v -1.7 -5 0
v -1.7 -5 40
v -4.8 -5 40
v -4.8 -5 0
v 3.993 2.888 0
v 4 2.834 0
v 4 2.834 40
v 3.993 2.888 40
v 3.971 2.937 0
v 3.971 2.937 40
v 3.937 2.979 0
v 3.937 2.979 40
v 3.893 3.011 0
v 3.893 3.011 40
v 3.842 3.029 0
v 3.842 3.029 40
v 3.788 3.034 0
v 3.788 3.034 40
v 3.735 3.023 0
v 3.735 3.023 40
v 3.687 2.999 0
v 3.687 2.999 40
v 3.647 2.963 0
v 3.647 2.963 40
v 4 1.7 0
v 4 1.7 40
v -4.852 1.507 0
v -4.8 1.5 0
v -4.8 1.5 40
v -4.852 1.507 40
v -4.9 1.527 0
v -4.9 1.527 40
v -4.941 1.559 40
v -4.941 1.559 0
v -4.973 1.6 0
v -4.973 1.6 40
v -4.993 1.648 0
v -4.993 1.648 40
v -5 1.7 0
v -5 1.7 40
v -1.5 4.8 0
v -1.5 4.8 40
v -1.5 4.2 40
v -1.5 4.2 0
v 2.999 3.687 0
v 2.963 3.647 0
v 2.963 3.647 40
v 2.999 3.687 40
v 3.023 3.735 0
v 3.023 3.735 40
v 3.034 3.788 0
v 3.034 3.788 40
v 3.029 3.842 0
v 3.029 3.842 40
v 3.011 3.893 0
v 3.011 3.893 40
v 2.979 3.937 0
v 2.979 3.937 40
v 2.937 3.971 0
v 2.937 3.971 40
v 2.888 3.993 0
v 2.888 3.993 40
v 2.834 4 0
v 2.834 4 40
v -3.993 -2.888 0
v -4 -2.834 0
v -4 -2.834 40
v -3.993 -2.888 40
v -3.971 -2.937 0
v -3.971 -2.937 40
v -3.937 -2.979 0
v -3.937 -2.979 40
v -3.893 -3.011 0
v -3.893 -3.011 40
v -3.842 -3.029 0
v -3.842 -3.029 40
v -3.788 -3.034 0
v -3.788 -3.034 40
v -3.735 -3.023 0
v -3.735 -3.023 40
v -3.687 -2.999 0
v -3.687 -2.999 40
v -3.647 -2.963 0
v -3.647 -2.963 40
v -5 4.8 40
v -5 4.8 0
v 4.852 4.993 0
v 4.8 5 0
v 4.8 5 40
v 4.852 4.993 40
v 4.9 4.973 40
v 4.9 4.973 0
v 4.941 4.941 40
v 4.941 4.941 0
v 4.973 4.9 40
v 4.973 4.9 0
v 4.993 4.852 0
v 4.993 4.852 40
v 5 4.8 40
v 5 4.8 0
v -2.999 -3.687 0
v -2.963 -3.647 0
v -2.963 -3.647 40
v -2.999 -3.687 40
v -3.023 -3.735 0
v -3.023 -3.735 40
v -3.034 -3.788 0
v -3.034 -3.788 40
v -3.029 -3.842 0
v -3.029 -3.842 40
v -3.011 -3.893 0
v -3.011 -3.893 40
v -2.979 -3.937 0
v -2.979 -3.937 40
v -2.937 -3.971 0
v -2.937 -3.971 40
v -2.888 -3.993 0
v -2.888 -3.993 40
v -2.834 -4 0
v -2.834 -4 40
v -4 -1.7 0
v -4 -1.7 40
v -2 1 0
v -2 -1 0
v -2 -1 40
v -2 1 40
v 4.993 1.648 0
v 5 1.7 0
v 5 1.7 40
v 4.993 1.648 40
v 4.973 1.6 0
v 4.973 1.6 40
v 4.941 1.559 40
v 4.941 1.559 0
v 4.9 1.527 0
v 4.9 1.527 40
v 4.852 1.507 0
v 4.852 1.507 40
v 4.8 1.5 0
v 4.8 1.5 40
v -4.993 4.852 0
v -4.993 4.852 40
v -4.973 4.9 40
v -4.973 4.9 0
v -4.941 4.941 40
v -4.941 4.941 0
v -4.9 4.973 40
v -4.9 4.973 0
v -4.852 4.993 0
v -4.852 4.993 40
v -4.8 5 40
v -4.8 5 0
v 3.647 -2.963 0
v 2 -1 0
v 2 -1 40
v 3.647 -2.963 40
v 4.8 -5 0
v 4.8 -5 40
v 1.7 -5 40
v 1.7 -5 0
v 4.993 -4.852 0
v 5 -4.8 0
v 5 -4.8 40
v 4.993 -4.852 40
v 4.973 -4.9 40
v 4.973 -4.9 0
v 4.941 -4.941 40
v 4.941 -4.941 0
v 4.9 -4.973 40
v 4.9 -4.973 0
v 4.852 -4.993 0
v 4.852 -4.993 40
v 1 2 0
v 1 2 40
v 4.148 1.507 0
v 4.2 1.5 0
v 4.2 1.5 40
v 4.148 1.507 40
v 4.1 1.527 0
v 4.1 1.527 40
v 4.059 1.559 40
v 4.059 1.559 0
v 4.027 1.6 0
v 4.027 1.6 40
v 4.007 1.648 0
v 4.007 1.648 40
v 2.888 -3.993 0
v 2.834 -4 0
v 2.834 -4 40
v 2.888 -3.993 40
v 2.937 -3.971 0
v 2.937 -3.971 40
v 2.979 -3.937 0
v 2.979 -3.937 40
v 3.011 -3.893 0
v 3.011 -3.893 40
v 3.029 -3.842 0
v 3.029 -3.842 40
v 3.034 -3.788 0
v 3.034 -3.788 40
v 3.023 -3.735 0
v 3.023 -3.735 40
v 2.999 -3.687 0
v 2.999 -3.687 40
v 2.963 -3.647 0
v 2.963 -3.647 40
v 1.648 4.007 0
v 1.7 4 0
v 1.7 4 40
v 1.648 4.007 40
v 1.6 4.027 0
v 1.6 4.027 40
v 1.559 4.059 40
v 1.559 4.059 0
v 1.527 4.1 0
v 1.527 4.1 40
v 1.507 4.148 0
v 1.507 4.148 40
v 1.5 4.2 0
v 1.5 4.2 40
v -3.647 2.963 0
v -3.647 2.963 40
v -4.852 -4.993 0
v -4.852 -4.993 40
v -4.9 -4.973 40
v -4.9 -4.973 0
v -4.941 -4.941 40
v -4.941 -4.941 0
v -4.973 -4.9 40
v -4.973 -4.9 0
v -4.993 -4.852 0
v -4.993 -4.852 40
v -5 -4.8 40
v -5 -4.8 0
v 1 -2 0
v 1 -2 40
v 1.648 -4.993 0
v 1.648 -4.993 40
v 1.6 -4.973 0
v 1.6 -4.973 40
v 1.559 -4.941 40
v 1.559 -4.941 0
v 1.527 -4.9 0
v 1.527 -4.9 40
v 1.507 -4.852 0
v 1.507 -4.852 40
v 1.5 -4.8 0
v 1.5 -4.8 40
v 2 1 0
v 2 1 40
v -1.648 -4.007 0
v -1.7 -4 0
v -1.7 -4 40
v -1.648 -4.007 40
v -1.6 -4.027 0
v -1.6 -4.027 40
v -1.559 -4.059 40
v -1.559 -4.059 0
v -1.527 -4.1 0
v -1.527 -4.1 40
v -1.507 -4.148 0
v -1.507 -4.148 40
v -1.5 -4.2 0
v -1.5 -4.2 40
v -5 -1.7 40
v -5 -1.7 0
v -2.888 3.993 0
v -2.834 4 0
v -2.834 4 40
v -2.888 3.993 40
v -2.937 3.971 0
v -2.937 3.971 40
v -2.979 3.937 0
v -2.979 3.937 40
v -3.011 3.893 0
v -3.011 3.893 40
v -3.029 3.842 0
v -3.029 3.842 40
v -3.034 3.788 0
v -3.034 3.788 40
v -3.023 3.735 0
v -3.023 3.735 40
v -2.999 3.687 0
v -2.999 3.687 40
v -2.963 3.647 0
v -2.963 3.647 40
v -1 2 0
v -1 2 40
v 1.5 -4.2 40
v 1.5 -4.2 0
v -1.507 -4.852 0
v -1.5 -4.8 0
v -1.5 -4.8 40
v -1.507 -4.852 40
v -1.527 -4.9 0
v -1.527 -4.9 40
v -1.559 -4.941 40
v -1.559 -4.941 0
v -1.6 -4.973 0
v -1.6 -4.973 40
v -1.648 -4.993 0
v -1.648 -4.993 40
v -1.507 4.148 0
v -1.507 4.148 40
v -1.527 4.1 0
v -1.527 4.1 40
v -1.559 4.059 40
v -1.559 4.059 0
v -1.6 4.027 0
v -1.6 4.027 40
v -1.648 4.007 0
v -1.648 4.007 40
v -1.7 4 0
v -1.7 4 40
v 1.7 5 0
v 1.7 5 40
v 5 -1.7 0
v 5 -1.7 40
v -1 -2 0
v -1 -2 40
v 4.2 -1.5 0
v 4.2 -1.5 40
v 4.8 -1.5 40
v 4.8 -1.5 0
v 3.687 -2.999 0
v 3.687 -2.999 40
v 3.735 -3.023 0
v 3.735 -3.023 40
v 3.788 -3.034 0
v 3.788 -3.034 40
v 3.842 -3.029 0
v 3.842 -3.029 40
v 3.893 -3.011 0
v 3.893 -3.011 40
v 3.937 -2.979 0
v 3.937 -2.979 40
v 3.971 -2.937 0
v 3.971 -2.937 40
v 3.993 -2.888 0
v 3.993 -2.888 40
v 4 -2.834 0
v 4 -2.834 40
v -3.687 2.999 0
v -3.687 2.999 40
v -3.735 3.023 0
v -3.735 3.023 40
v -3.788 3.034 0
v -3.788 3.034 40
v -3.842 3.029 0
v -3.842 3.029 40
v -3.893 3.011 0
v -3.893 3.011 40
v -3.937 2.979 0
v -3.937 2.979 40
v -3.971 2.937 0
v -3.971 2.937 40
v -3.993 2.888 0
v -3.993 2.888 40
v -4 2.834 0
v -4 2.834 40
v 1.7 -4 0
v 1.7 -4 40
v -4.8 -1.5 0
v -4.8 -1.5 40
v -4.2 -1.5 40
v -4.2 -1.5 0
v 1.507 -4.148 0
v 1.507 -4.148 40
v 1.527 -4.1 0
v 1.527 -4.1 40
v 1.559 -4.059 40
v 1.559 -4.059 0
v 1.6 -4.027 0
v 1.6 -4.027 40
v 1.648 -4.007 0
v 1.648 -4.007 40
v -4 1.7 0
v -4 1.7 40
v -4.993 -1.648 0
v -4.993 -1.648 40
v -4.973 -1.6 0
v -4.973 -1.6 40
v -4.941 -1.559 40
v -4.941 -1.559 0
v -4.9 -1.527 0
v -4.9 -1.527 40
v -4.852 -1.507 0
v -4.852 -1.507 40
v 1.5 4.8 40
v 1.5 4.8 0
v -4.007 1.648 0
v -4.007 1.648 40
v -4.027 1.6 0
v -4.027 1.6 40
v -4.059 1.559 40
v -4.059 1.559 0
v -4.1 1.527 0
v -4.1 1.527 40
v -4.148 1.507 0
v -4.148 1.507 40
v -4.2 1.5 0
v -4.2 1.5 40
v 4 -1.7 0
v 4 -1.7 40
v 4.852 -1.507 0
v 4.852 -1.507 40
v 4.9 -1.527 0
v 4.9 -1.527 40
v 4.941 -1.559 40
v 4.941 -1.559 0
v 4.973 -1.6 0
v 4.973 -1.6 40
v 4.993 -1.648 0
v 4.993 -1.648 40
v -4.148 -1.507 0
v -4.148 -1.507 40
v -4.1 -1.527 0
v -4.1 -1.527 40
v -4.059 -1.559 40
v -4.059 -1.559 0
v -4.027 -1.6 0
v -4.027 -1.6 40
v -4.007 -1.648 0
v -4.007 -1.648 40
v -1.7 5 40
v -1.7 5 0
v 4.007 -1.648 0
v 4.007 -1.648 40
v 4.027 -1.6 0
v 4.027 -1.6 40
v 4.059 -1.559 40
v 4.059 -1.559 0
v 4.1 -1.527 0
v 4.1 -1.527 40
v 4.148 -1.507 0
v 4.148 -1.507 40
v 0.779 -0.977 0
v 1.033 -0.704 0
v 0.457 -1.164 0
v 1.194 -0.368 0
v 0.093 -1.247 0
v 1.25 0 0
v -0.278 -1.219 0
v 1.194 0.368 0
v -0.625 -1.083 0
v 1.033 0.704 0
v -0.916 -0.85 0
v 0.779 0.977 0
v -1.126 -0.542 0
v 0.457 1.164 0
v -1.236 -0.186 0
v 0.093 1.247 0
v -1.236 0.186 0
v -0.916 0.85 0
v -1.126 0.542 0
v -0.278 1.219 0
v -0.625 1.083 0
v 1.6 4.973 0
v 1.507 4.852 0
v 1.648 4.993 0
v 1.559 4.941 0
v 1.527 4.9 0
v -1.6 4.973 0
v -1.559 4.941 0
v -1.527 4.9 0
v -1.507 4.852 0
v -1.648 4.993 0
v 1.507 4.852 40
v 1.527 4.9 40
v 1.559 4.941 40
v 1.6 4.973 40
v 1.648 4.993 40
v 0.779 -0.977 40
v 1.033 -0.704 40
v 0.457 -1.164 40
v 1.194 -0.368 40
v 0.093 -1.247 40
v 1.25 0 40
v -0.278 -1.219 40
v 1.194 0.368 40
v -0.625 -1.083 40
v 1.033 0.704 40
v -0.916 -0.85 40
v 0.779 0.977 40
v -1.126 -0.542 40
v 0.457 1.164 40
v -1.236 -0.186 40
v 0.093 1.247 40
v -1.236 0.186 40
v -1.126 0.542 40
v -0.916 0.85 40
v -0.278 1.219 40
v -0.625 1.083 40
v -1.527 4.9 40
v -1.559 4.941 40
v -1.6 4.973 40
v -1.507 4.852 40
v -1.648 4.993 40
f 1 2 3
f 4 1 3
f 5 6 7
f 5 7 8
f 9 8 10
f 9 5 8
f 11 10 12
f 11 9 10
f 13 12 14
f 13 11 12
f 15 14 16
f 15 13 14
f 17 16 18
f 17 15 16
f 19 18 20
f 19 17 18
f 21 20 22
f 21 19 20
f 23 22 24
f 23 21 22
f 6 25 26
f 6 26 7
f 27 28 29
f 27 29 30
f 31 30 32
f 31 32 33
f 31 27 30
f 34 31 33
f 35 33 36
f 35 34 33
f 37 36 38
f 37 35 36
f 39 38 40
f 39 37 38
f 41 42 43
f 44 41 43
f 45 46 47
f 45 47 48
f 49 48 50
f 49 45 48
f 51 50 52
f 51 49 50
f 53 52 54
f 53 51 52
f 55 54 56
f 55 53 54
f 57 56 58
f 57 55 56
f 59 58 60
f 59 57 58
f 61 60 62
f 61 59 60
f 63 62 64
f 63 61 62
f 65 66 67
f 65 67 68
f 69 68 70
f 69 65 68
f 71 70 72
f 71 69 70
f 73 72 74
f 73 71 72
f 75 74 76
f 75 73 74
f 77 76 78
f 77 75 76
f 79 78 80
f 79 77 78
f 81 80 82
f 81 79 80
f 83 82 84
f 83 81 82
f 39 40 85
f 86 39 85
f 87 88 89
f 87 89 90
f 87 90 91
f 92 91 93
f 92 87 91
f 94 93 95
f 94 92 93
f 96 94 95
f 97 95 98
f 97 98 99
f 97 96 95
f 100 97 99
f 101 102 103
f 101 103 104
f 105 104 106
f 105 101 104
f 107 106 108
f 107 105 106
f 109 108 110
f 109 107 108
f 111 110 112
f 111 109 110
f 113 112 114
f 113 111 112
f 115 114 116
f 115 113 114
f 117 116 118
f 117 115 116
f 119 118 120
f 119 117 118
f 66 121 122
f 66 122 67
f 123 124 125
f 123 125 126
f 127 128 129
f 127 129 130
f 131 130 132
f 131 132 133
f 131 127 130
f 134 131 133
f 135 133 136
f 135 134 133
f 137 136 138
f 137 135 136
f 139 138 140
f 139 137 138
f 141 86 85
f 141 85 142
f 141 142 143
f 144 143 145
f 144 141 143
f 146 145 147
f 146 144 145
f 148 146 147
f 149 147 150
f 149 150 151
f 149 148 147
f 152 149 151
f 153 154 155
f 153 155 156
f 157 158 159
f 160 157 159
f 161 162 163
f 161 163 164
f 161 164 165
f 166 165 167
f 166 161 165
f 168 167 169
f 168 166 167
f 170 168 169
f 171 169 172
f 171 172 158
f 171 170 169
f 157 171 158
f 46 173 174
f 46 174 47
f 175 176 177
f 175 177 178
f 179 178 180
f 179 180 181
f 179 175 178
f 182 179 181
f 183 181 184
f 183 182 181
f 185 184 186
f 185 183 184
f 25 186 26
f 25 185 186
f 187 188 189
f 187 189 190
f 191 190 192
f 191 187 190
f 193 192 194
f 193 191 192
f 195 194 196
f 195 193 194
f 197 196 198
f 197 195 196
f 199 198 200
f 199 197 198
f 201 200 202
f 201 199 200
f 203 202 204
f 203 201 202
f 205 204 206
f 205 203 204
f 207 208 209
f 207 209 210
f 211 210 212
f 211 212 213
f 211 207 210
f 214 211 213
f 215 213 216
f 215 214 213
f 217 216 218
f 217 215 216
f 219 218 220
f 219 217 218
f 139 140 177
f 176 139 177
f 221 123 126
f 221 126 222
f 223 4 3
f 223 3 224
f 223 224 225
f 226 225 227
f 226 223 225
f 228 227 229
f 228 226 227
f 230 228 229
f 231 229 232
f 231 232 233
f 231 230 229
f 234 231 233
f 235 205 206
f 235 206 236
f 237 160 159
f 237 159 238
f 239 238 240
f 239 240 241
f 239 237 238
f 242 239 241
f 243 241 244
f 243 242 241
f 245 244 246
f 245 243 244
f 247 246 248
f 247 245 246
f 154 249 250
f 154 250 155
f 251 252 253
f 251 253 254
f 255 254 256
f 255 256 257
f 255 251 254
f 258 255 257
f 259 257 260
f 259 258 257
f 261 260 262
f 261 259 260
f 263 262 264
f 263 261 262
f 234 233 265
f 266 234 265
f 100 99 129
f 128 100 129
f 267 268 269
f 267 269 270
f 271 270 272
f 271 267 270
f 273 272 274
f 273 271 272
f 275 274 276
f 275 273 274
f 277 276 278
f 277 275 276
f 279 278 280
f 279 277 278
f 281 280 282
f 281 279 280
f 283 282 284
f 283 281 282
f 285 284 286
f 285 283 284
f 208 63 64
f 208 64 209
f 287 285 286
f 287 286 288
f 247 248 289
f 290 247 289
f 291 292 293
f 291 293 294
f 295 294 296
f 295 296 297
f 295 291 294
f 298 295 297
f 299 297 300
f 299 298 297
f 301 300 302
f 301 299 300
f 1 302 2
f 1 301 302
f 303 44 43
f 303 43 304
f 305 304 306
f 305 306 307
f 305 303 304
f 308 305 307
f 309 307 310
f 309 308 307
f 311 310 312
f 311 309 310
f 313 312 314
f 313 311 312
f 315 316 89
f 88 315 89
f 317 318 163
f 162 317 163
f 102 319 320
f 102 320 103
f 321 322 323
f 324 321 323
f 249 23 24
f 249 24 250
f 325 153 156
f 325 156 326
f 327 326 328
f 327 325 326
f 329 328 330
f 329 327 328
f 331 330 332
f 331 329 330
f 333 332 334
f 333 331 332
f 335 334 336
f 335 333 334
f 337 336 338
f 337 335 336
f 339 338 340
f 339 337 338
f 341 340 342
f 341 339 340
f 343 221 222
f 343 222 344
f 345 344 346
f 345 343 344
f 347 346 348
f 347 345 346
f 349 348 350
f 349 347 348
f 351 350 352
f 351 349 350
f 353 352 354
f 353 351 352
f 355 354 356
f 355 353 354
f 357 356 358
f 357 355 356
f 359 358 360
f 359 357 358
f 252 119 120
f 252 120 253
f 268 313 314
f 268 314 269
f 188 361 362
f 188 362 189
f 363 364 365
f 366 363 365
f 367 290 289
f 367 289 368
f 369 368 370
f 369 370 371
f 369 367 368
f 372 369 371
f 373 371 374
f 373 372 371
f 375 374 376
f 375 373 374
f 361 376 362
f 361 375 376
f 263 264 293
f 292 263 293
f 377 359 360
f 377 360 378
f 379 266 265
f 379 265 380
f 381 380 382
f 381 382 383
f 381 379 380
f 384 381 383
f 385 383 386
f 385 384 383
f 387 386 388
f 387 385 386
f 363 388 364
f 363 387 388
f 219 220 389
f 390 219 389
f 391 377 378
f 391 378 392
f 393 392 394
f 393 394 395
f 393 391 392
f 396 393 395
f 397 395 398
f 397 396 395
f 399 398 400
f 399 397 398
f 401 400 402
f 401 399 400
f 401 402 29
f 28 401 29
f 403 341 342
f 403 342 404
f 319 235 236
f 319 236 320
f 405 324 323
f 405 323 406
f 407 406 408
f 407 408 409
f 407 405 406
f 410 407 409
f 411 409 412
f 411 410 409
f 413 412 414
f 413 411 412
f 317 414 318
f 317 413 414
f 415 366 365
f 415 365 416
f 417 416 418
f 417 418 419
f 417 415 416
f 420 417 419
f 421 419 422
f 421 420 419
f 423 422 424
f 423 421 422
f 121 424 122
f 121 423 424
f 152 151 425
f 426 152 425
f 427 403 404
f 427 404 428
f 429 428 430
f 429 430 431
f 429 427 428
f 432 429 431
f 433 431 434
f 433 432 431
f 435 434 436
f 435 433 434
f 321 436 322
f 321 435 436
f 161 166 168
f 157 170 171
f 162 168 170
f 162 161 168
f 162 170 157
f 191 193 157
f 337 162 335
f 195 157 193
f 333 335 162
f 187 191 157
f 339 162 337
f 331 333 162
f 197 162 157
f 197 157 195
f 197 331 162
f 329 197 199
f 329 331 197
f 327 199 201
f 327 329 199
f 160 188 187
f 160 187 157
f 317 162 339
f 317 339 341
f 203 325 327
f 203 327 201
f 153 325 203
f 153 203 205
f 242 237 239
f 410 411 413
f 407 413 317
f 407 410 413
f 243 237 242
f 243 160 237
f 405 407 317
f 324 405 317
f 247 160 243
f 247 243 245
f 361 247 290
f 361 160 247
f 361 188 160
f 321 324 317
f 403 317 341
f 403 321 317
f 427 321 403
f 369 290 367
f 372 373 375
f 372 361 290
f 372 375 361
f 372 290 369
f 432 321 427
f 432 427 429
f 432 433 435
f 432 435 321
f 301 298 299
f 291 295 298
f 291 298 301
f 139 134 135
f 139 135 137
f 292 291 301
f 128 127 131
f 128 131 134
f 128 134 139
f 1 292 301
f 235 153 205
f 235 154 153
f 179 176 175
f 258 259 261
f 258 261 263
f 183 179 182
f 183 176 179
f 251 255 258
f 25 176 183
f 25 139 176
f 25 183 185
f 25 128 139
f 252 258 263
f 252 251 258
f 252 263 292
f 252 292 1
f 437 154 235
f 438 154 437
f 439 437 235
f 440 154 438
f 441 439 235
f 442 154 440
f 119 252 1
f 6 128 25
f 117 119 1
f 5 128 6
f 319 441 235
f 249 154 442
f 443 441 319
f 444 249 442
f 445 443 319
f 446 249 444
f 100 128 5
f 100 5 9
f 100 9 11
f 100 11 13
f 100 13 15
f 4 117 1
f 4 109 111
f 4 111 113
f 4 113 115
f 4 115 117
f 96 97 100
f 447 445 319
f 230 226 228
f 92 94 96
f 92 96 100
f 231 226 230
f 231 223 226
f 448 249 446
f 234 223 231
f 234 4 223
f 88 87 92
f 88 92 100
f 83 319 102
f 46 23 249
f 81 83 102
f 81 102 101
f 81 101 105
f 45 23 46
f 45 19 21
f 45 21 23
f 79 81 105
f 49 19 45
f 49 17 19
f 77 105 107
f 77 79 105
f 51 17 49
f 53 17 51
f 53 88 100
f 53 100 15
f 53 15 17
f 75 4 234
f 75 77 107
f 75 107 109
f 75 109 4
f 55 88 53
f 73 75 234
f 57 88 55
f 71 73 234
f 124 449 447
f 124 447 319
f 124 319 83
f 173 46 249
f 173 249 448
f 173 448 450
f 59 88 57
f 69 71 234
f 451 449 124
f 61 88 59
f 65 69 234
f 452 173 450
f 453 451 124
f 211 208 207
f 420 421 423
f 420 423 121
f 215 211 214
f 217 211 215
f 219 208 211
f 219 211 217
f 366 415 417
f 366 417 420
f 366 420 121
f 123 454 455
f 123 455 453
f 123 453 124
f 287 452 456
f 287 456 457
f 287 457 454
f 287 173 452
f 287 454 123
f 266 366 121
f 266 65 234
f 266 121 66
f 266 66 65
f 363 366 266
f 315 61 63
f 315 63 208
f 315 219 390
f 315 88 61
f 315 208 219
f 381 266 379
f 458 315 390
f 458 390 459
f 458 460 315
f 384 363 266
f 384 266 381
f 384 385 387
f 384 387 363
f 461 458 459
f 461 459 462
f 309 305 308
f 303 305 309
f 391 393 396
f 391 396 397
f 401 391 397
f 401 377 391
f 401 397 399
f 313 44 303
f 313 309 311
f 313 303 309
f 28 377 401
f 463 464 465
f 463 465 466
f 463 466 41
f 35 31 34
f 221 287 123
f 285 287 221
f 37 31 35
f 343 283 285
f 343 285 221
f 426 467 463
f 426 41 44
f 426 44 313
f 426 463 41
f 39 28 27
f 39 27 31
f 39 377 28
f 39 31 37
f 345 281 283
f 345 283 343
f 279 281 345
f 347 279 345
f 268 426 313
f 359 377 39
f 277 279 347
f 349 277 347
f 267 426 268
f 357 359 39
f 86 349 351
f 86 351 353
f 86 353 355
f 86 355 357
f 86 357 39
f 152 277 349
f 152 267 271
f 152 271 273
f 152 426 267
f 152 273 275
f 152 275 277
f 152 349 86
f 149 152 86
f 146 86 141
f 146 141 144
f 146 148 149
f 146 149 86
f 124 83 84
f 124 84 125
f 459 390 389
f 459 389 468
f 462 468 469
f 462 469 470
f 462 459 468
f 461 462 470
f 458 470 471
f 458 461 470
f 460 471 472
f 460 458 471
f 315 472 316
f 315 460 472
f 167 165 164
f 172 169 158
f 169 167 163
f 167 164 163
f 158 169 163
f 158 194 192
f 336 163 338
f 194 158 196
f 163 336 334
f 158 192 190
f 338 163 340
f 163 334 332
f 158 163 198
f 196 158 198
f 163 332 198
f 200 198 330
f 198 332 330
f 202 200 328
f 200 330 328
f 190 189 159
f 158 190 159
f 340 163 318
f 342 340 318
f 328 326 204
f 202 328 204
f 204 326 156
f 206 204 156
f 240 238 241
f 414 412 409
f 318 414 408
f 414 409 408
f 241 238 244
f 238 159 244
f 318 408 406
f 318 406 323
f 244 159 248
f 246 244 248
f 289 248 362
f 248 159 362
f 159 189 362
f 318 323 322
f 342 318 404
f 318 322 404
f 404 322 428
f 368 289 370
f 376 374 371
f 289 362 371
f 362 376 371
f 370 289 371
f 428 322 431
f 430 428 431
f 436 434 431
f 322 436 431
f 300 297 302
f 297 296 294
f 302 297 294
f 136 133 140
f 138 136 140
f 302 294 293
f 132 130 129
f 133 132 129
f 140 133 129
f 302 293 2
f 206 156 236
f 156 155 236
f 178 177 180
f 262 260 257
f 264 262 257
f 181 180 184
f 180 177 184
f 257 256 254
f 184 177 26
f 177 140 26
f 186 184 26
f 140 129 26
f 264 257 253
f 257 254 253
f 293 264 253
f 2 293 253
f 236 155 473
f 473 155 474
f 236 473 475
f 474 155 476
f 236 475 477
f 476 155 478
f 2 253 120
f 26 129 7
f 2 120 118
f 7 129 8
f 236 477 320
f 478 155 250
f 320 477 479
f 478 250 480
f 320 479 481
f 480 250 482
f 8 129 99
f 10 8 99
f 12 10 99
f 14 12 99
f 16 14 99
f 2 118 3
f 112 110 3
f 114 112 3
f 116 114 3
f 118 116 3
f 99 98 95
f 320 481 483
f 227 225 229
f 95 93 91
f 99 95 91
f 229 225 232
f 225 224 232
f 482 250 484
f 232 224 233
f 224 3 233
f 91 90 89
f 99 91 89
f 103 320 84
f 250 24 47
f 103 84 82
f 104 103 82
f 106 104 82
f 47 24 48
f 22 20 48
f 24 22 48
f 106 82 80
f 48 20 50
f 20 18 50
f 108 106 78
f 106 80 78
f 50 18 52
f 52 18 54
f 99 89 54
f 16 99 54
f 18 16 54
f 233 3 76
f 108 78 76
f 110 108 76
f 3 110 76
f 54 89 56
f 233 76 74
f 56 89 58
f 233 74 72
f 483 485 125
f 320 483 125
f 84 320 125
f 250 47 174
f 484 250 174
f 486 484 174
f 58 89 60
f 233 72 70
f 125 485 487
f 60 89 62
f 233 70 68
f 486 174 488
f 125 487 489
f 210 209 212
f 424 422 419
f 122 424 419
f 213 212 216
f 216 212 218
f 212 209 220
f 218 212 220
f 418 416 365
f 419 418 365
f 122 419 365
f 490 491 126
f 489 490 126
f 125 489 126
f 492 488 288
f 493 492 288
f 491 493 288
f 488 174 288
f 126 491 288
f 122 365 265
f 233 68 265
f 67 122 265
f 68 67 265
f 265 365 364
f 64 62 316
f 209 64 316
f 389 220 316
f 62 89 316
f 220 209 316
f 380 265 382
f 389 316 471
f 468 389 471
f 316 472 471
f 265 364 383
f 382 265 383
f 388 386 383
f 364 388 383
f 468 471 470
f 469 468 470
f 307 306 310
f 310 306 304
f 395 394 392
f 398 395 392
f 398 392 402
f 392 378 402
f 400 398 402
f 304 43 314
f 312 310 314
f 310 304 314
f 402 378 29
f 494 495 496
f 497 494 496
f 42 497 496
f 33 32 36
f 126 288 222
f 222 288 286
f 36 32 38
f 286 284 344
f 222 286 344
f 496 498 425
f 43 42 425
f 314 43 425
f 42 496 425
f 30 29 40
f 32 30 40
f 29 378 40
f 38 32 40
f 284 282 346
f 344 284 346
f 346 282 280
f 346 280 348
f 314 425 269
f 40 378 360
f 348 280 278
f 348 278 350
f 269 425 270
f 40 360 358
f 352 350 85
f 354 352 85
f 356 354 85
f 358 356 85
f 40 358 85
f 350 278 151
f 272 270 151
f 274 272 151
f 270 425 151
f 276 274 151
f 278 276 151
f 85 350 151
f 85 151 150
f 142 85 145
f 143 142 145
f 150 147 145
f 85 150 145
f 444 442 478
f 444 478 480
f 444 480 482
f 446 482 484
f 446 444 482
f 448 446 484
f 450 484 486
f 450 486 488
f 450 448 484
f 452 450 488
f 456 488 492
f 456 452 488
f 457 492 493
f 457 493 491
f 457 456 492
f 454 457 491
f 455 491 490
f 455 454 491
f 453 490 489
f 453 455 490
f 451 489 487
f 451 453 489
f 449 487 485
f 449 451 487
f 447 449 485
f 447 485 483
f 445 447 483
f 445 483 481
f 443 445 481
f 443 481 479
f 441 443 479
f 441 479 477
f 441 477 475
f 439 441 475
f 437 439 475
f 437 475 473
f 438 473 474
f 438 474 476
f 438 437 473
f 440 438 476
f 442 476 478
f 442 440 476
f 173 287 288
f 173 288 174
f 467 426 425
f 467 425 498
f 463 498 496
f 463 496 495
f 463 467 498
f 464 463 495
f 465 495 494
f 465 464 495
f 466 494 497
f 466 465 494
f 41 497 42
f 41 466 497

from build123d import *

# Parameters (mm, degrees)
SKETCH1_R           = 1.25
BOSS_EXTRUDE1_DEPTH = 40


with BuildPart() as part:
    # Sketch1 → Boss-Extrude1 (new body)
    with BuildSketch(Plane.XY):
        with BuildLine():
            Line((-4.8, 5), (-1.7, 5))
            ThreePointArc((-1.7, 5), (-1.558578644, 4.941421356), (-1.5, 4.8))
            Line((-1.5, 4.8), (-1.5, 4.2))
            ThreePointArc((-1.5, 4.2), (-1.558578644, 4.058578644), (-1.7, 4))
            Line((-1.7, 4), (-2.834011701, 4))
            ThreePointArc((-2.834011701, 4), (-3.021950225, 3.868404029), (-2.962569223, 3.646791111))
            Line((-2.962569223, 3.646791111), (-1, 2))
            Line((-1, 2), (1, 2))
            Line((1, 2), (2.962569223, 3.646791111))
            ThreePointArc((2.962569223, 3.646791111), (3.021950225, 3.868404029), (2.834011701, 4))
            Line((2.834011701, 4), (1.7, 4))
            ThreePointArc((1.7, 4), (1.558578644, 4.058578644), (1.5, 4.2))
            Line((1.5, 4.2), (1.5, 4.8))
            ThreePointArc((1.5, 4.8), (1.558578644, 4.941421356), (1.7, 5))
            Line((1.7, 5), (4.8, 5))
            ThreePointArc((4.8, 5), (4.941421356, 4.941421356), (5, 4.8))
            Line((5, 4.8), (5, 1.7))
            ThreePointArc((5, 1.7), (4.941421356, 1.558578644), (4.8, 1.5))
            Line((4.8, 1.5), (4.2, 1.5))
            ThreePointArc((4.2, 1.5), (4.058578644, 1.558578644), (4, 1.7))
            Line((4, 1.7), (4, 2.834011701))
            ThreePointArc((4, 2.834011701), (3.868404029, 3.021950225), (3.646791111, 2.962569223))
            Line((3.646791111, 2.962569223), (2, 1))
            Line((2, 1), (2, -1))
            Line((2, -1), (3.646791111, -2.962569223))
            ThreePointArc((3.646791111, -2.962569223), (3.868404029, -3.021950225), (4, -2.834011701))
            Line((4, -2.834011701), (4, -1.7))
            ThreePointArc((4, -1.7), (4.058578644, -1.558578644), (4.2, -1.5))
            Line((4.2, -1.5), (4.8, -1.5))
            ThreePointArc((4.8, -1.5), (4.941421356, -1.558578644), (5, -1.7))
            Line((5, -1.7), (5, -4.8))
            ThreePointArc((5, -4.8), (4.941421356, -4.941421356), (4.8, -5))
            Line((4.8, -5), (1.7, -5))
            ThreePointArc((1.7, -5), (1.558578644, -4.941421356), (1.5, -4.8))
            Line((1.5, -4.8), (1.5, -4.2))
            ThreePointArc((1.5, -4.2), (1.558578644, -4.058578644), (1.7, -4))
            Line((1.7, -4), (2.834011701, -4))
            ThreePointArc((2.834011701, -4), (3.021950225, -3.868404029), (2.962569223, -3.646791111))
            Line((2.962569223, -3.646791111), (1, -2))
            Line((1, -2), (-1, -2))
            Line((-1, -2), (-2.962569223, -3.646791111))
            ThreePointArc((-2.962569223, -3.646791111), (-3.021950225, -3.868404029), (-2.834011701, -4))
            Line((-2.834011701, -4), (-1.7, -4))
            ThreePointArc((-1.7, -4), (-1.558578644, -4.058578644), (-1.5, -4.2))
            Line((-1.5, -4.2), (-1.5, -4.8))
            ThreePointArc((-1.5, -4.8), (-1.558578644, -4.941421356), (-1.7, -5))
            Line((-1.7, -5), (-4.8, -5))
            ThreePointArc((-4.8, -5), (-4.941421356, -4.941421356), (-5, -4.8))
            Line((-5, -4.8), (-5, -1.7))
            ThreePointArc((-5, -1.7), (-4.941421356, -1.558578644), (-4.8, -1.5))
            Line((-4.8, -1.5), (-4.2, -1.5))
            ThreePointArc((-4.2, -1.5), (-4.058578644, -1.558578644), (-4, -1.7))
            Line((-4, -1.7), (-4, -2.834011701))
            ThreePointArc((-4, -2.834011701), (-3.868404029, -3.021950225), (-3.646791111, -2.962569223))
            Line((-3.646791111, -2.962569223), (-2, -1))
            Line((-2, -1), (-2, 1))
            Line((-2, 1), (-3.646791111, 2.962569223))
            ThreePointArc((-3.646791111, 2.962569223), (-3.868404029, 3.021950225), (-4, 2.834011701))
            Line((-4, 2.834011701), (-4, 1.7))
            ThreePointArc((-4, 1.7), (-4.058578644, 1.558578644), (-4.2, 1.5))
            Line((-4.2, 1.5), (-4.8, 1.5))
            ThreePointArc((-4.8, 1.5), (-4.941421356, 1.558578644), (-5, 1.7))
            Line((-5, 1.7), (-5, 4.8))
            ThreePointArc((-5, 4.8), (-4.941421356, 4.941421356), (-4.8, 5))
        make_face()
        Circle(SKETCH1_R, mode=Mode.SUBTRACT)
    extrude(amount=BOSS_EXTRUDE1_DEPTH)


solid = part.part
